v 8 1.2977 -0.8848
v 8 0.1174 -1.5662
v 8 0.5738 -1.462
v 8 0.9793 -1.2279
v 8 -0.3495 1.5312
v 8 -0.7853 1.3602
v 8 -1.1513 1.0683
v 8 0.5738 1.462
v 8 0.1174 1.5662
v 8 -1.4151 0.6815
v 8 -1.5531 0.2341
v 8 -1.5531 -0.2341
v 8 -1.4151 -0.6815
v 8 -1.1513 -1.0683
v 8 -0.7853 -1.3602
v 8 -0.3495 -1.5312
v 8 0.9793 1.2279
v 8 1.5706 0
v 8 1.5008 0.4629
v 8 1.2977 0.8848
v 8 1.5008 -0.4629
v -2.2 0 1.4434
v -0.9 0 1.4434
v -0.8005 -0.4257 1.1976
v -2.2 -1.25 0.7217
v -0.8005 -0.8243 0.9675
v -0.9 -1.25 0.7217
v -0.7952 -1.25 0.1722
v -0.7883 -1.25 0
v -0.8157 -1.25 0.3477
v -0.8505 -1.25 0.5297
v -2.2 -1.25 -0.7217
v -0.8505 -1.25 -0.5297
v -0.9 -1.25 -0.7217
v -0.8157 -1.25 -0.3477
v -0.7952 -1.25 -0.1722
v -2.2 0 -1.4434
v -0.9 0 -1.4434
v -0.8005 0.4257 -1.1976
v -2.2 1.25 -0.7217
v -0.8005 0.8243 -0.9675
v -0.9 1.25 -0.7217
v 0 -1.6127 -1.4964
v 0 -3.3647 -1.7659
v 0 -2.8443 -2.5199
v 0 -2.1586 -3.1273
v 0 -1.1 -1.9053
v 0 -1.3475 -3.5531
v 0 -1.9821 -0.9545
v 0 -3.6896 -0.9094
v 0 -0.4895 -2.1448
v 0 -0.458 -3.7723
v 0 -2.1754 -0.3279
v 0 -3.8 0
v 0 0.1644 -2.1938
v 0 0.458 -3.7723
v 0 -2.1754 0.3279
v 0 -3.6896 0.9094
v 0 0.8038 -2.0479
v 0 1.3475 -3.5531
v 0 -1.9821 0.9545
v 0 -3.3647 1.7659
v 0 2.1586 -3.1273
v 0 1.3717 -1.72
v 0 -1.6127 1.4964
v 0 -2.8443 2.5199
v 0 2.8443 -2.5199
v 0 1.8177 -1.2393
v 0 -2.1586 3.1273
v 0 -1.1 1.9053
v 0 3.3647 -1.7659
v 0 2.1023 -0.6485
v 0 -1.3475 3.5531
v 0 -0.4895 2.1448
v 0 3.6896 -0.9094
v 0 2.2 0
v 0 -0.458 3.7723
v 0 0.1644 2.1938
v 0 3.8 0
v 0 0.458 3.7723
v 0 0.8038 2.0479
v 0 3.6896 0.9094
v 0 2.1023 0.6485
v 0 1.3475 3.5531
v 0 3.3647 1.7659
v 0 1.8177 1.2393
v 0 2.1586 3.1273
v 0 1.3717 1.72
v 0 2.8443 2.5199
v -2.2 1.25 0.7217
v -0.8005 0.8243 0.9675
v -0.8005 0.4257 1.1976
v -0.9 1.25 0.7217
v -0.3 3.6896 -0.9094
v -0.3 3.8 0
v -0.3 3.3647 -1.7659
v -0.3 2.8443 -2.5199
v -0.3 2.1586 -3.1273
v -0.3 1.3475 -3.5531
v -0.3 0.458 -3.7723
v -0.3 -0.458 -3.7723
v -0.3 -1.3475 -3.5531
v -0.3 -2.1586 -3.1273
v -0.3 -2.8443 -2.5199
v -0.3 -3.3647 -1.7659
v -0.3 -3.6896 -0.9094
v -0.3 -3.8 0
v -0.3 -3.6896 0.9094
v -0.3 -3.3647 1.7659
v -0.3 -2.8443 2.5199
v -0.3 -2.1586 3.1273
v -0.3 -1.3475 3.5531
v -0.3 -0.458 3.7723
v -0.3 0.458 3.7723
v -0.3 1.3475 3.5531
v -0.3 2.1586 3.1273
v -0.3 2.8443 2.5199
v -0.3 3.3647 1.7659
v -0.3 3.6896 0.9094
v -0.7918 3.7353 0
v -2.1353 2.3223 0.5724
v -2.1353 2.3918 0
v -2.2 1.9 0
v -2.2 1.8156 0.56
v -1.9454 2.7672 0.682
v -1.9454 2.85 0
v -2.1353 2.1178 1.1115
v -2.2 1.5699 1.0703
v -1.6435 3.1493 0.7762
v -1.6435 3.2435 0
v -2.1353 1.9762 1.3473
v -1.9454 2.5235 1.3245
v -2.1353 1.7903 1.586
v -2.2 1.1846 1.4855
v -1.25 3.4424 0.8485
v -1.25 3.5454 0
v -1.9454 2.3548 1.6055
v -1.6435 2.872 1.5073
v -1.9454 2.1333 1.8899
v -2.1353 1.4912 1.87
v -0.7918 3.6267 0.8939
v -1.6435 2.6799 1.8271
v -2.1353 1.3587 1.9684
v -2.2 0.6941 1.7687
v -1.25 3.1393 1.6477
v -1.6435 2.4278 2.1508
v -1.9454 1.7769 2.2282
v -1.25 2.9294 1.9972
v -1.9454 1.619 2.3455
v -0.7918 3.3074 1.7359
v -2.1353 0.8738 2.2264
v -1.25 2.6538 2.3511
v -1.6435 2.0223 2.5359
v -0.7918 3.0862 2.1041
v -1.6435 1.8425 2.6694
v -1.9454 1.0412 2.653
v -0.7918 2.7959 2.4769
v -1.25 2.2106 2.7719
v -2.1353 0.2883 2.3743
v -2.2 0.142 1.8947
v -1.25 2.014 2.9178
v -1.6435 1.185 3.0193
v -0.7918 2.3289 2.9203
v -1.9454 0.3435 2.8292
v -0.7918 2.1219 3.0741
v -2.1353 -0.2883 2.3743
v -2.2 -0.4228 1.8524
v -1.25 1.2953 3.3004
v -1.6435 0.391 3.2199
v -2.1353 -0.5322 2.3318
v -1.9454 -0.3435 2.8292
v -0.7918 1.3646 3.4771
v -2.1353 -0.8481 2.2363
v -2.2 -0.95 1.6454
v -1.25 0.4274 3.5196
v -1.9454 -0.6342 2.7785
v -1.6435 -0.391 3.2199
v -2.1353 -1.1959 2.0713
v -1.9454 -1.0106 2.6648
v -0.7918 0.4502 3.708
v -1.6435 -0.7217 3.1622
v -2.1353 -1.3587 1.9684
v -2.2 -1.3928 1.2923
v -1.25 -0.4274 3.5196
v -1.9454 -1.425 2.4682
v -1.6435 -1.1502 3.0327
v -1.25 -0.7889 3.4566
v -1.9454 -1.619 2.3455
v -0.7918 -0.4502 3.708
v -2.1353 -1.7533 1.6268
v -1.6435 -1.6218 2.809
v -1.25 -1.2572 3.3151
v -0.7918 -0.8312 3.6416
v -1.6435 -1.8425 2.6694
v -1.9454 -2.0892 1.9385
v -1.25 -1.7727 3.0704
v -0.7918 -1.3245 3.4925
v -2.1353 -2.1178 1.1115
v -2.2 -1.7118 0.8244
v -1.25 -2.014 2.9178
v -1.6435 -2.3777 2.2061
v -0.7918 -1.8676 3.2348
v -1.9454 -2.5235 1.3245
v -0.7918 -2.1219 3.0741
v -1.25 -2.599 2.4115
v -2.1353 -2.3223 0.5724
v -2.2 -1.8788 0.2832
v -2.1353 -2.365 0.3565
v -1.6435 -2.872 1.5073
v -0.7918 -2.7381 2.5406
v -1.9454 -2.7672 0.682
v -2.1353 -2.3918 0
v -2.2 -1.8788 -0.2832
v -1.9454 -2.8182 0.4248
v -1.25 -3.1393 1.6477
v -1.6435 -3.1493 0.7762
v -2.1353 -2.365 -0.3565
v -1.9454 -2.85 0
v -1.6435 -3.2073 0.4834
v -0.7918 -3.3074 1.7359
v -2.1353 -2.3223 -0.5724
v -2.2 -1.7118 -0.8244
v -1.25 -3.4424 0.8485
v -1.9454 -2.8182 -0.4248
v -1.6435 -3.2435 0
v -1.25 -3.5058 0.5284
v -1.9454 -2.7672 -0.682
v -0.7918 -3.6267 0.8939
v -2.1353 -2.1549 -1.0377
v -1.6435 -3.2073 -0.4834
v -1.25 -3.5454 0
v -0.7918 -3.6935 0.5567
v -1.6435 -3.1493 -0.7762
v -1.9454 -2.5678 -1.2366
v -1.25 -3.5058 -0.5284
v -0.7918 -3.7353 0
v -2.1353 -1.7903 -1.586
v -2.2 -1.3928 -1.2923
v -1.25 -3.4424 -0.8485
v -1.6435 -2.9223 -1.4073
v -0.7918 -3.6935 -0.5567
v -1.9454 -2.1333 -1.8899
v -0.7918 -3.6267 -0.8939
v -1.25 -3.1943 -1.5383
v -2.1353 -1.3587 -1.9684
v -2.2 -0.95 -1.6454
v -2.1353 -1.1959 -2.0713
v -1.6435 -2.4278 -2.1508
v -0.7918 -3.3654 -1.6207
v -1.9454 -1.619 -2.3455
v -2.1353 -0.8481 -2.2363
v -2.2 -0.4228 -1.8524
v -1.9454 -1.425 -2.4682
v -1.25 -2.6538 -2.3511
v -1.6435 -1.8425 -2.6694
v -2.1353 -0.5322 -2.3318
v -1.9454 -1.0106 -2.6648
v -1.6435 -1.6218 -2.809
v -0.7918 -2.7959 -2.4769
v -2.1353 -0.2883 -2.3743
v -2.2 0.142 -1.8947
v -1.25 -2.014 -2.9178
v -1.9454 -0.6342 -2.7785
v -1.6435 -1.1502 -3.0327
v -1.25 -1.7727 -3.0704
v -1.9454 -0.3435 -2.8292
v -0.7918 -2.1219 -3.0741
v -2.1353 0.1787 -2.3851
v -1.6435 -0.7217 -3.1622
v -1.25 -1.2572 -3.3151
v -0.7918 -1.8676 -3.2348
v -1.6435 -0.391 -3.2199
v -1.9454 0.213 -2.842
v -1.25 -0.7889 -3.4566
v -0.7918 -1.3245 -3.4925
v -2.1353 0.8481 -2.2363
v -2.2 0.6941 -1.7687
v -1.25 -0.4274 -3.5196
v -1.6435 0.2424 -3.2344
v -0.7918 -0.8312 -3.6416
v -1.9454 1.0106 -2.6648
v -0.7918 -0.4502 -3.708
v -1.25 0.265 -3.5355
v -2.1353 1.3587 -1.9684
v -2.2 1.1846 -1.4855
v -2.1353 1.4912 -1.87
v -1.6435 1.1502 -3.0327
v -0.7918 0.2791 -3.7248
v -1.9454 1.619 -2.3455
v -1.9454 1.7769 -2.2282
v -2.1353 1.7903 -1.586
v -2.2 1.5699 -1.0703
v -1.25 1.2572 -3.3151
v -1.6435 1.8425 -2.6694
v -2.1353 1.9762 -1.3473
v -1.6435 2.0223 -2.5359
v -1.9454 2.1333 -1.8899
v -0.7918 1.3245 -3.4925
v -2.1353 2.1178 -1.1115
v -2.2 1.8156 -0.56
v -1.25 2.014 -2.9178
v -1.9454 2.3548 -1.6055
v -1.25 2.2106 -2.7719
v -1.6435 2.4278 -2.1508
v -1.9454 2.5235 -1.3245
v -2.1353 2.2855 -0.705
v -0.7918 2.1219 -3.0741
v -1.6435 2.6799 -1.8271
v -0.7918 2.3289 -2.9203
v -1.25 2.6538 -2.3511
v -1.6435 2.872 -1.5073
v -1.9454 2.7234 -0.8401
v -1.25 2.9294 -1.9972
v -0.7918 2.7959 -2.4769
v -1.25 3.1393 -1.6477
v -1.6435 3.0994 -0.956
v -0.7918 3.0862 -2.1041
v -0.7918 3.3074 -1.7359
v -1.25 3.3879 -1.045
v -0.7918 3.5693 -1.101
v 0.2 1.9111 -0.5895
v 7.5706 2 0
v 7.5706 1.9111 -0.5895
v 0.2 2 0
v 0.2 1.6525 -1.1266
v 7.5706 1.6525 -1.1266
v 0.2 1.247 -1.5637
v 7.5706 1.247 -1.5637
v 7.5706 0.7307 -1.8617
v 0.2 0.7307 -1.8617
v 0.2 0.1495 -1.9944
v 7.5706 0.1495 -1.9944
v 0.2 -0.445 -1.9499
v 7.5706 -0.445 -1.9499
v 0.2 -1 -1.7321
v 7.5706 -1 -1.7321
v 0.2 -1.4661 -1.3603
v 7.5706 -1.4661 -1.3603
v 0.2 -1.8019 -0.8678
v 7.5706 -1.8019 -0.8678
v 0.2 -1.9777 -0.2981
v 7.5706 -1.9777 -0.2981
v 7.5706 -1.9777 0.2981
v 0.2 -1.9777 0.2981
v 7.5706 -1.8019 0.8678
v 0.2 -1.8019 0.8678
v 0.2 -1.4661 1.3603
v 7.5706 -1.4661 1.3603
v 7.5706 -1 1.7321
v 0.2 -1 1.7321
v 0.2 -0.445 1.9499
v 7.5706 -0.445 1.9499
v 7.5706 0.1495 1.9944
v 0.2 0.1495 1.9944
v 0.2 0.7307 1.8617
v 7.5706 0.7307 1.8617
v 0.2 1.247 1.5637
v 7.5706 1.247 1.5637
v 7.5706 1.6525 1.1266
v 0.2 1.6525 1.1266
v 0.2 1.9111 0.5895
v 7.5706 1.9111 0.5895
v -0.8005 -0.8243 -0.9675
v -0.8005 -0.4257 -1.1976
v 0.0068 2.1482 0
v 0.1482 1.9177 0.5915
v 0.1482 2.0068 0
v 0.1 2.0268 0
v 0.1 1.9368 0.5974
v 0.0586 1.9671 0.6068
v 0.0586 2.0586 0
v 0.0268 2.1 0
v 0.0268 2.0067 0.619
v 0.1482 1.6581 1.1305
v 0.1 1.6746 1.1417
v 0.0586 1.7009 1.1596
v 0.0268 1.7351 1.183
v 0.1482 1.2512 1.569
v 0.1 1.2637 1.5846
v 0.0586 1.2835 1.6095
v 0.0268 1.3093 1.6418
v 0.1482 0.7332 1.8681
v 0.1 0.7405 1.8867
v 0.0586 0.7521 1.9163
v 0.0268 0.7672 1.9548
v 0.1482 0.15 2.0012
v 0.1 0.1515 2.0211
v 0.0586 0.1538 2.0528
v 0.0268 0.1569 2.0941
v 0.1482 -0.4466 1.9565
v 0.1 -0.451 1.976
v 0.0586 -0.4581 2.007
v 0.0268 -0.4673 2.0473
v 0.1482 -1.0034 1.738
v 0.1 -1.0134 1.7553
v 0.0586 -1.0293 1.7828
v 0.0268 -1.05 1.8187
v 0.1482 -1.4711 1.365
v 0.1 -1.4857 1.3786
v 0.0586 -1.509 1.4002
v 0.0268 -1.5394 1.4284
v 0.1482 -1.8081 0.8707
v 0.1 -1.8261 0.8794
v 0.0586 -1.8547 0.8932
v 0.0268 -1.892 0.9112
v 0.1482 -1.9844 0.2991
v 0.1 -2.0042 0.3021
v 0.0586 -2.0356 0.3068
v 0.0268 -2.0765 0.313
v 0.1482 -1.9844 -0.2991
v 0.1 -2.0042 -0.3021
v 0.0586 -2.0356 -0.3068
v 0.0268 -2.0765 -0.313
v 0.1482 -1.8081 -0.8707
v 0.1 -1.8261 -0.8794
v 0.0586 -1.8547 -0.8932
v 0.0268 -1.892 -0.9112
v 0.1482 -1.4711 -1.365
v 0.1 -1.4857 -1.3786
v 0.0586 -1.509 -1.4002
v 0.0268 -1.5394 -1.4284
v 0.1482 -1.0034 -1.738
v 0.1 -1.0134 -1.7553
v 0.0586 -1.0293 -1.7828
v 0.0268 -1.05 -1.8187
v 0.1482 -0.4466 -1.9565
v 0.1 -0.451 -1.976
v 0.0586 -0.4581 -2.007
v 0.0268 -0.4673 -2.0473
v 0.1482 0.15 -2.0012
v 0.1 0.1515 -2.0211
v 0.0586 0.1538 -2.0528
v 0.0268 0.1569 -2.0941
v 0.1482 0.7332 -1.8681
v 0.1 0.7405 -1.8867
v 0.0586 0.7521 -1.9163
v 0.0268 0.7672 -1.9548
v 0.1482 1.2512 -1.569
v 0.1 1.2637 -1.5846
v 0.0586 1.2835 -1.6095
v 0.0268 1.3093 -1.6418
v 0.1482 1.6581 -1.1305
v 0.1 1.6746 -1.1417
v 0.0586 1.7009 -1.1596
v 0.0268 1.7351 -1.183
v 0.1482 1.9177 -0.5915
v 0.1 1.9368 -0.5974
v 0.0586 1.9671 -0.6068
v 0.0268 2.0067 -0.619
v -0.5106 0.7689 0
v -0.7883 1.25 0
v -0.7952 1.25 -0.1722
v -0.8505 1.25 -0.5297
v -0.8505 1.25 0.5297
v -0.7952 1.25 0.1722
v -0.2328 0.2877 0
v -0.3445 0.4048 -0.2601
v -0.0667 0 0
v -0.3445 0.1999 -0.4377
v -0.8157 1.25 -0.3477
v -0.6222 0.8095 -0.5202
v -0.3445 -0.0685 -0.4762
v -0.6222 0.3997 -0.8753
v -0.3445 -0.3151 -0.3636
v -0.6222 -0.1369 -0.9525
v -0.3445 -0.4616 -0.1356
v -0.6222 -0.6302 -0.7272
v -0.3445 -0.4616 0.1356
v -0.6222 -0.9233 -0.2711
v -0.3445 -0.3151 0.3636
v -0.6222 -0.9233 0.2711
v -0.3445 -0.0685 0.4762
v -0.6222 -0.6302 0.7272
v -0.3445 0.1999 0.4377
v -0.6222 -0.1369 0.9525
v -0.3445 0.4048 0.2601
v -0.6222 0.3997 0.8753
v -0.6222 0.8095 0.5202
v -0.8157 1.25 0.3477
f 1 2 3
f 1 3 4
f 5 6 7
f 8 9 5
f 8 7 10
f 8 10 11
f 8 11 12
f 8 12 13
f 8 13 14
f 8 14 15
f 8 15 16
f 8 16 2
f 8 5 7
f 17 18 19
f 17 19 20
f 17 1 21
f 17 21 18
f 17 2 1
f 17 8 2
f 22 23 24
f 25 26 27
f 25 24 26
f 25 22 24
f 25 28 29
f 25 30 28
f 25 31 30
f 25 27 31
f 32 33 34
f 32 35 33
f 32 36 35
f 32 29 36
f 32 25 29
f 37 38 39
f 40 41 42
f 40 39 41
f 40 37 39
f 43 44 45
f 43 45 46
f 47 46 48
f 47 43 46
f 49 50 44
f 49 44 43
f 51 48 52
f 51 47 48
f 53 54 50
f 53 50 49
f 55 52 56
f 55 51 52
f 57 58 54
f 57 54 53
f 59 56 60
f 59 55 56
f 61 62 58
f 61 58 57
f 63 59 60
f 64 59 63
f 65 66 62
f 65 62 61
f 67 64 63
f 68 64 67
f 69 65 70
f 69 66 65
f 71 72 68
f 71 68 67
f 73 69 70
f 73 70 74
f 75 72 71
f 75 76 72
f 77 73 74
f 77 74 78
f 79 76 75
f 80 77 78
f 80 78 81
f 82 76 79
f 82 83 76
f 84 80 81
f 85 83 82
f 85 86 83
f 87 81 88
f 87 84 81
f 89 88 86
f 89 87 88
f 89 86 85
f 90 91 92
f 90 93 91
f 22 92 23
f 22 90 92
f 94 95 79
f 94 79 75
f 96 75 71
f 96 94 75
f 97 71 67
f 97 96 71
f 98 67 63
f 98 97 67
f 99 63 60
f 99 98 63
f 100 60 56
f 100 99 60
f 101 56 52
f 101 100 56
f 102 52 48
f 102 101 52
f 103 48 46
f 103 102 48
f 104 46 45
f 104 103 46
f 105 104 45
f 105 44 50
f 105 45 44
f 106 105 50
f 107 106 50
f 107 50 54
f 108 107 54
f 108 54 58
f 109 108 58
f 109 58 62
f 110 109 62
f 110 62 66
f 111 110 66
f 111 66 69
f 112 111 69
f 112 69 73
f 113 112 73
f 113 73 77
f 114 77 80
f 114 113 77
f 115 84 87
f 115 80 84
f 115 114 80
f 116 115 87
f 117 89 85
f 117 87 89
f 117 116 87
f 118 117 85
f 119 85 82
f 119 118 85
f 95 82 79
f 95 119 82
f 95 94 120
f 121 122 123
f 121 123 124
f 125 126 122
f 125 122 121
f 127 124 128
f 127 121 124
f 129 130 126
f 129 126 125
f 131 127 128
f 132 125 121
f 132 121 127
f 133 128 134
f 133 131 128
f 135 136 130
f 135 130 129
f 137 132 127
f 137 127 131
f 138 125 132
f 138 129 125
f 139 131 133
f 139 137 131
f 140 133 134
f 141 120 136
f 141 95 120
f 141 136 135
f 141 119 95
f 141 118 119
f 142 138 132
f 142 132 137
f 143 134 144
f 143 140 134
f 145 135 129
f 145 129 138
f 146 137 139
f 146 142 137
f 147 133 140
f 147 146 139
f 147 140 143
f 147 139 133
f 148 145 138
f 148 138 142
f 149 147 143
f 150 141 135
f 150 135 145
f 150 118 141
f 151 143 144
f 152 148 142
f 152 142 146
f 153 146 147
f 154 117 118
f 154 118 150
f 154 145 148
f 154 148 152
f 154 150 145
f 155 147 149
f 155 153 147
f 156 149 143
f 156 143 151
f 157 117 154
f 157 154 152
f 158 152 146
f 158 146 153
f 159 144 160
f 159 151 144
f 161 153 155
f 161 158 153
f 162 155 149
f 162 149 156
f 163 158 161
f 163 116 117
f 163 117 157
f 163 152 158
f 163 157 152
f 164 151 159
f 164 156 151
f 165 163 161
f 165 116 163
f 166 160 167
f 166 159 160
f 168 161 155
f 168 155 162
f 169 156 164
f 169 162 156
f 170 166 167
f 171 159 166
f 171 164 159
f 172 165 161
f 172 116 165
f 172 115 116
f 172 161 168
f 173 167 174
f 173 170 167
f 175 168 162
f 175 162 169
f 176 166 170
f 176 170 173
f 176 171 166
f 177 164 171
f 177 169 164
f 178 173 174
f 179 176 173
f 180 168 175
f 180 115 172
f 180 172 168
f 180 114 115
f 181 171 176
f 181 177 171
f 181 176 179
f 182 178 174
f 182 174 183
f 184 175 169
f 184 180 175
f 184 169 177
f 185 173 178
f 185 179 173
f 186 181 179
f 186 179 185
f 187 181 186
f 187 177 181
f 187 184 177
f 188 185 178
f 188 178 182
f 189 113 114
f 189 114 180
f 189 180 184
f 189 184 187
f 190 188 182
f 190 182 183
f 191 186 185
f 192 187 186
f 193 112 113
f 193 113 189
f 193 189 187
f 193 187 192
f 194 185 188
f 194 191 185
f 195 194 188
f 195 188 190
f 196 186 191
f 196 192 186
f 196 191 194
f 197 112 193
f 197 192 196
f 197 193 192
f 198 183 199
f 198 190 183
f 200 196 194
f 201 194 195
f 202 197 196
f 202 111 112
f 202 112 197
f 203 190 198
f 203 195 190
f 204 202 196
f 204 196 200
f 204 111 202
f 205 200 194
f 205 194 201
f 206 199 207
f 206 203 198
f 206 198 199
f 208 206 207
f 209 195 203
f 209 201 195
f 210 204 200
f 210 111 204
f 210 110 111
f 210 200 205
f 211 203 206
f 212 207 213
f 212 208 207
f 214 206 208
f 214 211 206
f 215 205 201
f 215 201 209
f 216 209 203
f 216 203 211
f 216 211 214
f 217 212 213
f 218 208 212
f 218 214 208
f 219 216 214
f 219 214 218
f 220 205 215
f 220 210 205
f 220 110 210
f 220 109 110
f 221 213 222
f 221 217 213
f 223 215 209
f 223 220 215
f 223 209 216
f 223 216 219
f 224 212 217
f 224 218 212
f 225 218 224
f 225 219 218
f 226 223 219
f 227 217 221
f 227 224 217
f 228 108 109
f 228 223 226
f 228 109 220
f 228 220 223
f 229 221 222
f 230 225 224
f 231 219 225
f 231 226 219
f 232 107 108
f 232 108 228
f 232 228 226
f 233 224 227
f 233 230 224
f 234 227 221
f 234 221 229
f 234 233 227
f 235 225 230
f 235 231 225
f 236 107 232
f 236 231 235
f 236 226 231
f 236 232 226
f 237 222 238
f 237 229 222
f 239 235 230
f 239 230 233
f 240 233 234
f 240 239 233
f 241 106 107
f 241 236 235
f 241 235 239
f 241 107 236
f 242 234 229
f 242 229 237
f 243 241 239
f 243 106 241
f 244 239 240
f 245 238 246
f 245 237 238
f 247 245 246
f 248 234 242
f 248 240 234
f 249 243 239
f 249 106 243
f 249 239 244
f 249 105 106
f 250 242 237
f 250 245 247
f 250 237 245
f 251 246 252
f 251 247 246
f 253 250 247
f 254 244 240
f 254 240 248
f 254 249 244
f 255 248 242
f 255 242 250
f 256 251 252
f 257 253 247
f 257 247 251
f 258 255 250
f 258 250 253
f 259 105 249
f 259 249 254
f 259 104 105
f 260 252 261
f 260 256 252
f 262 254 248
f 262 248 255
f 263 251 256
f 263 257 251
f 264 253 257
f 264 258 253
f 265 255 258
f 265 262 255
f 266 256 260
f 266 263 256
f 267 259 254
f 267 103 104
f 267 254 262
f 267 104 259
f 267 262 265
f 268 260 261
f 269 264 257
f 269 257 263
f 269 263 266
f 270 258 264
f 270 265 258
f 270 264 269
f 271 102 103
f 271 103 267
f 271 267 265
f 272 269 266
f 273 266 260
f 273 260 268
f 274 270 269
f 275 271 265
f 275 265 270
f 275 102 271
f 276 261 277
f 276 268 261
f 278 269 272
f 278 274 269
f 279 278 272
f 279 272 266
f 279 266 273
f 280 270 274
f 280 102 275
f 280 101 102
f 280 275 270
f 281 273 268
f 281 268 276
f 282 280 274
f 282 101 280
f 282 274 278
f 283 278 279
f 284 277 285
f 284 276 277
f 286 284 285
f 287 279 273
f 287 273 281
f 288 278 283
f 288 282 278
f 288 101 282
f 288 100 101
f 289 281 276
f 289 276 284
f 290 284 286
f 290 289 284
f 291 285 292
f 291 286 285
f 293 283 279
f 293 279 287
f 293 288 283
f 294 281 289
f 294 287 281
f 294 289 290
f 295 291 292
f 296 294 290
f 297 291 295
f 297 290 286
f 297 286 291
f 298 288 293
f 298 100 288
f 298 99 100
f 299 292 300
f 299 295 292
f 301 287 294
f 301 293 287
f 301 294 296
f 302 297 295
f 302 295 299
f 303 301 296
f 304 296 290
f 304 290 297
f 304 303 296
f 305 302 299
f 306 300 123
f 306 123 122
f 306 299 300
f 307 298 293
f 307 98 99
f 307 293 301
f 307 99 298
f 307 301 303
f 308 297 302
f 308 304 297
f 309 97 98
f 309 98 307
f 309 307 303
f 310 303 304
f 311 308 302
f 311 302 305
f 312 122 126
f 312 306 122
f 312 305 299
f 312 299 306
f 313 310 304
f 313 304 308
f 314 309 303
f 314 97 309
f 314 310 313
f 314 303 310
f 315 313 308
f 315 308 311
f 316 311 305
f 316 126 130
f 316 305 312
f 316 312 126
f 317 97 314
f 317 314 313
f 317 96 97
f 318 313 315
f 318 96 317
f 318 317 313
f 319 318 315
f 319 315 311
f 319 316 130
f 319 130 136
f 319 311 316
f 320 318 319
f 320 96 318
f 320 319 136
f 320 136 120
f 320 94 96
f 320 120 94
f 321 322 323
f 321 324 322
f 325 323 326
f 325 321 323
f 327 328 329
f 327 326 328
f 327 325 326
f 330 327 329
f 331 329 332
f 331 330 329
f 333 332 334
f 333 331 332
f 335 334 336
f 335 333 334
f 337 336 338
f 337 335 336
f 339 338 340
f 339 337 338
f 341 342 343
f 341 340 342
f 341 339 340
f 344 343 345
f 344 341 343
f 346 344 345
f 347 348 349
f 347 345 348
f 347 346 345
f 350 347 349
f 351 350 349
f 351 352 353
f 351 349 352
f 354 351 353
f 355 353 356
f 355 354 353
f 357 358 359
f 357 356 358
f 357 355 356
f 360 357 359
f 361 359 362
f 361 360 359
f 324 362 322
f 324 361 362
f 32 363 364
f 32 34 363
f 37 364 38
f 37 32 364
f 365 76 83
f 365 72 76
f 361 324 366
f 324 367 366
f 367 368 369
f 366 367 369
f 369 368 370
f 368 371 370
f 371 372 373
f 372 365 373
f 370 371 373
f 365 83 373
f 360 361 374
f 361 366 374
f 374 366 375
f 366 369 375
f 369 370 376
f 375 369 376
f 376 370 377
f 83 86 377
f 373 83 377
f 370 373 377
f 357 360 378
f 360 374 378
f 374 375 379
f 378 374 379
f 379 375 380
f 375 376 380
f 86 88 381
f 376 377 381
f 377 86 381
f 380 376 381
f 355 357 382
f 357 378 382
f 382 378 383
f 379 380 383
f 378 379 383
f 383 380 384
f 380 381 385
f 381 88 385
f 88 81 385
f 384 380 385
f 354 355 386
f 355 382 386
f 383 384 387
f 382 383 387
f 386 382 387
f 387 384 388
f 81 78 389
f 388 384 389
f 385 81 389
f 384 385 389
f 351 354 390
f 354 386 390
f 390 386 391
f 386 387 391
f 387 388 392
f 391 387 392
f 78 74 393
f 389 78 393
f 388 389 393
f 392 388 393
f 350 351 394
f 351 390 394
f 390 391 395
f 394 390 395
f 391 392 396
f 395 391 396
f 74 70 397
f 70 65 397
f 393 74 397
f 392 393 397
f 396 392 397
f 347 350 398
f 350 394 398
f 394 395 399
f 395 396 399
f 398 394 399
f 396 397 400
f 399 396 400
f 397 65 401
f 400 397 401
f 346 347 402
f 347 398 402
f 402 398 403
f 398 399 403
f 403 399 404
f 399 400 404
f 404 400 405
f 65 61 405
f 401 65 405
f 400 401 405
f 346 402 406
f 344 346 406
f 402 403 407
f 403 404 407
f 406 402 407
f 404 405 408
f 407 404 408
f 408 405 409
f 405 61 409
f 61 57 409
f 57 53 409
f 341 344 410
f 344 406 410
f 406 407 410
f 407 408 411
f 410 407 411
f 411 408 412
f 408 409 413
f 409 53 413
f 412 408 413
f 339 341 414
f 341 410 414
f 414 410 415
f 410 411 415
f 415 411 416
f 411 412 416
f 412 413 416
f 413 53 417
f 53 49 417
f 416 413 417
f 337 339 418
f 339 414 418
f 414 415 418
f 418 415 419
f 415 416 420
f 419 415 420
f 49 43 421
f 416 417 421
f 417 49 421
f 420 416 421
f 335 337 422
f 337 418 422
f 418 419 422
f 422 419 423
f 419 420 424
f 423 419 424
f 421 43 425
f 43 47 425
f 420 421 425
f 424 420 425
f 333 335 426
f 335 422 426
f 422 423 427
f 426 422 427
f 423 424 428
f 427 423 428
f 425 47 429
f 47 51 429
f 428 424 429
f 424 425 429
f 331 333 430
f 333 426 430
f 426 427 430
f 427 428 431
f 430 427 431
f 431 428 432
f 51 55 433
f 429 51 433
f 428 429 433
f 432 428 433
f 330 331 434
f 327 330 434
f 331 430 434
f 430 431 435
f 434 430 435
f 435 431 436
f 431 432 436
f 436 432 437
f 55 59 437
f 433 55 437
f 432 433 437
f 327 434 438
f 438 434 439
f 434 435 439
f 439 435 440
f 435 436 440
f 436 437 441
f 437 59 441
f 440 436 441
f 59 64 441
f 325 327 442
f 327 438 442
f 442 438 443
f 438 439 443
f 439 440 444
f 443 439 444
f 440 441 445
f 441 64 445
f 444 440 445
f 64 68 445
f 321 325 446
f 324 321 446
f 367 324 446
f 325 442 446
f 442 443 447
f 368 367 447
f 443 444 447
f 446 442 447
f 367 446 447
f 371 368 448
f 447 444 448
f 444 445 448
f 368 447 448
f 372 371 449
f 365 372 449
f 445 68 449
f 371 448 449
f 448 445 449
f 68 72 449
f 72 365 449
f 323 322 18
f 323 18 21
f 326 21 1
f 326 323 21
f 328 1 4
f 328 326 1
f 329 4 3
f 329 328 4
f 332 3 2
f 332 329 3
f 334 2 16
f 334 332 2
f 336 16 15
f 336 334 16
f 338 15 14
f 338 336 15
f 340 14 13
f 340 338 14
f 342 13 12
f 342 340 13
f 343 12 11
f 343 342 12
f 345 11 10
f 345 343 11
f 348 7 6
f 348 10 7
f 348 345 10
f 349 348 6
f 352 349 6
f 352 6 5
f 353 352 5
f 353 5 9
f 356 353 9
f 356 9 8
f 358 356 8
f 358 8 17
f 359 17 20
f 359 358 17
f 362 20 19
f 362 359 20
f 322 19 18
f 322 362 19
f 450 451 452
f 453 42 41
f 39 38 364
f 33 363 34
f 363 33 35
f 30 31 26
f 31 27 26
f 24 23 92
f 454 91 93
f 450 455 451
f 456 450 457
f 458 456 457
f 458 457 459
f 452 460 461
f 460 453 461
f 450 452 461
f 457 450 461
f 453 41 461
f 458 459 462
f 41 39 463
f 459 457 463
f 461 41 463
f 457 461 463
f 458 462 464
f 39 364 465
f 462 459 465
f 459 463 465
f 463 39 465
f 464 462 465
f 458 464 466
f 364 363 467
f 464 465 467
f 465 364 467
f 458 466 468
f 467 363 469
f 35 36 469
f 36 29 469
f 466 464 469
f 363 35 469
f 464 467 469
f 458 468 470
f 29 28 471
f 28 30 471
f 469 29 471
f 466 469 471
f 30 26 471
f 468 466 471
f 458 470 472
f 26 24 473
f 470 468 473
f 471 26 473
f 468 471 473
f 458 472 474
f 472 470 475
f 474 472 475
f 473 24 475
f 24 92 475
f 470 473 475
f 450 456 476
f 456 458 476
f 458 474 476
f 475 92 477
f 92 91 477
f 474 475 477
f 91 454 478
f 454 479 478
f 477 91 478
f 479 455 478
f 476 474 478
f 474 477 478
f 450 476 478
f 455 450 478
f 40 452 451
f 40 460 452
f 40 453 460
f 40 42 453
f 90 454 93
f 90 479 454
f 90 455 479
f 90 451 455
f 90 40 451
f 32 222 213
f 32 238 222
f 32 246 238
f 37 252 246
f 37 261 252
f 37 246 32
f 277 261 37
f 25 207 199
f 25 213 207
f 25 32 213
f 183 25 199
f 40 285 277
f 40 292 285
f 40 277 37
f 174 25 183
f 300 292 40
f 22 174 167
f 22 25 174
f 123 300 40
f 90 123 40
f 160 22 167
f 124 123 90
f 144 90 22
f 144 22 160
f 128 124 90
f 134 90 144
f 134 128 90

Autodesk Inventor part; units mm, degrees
ref_plane "YZ Plane" through (0, 0, 0) normal (1, 0, 0) x (0, 1, 0)
ref_plane "XZ Plane" through (0, 0, 0) normal (0, 1, 0) x (-1, 0, 0)
sketch "Sketch1" plane through (0, 0, 0) normal (0, 0, 1) x (1, 0, 0)
  line L0 (-0.0667, 0) -> (8, 0)
  line L1 (8, 0) -> (8, 2)
  line L2 (8, 2) -> (1.4, 2)
  line L3 (1.4, 2) -> (0.9706, 2)
  line L4 (0.9706, 2) -> (0, 2)
  line L5 (0, 2) -> (0, 3.8)
  line L6 (0, 3.8) -> (-2.2, 3.8)
  line L7 (-2.2, 3.8) -> (-2.2, 1.4434)
  line L8 (-2.2, 1.4434) -> (-0.9, 1.4434)
  line L9 (-0.9, 1.4434) -> (-0.0667, 0)
  line L10 (-4.24, 0) -> (10.04, 0) projected
  line L11 (0, -0.76) -> (0, 4.56) projected
  line L12 (1.4, 2) -> (0, 2) construction
  dimension "d0" = 6.6
  dimension "d1" = 0.4294
  dimension "d2" = 2.2
  dimension "d3" = 1.3
  dimension "d4" = 60
  dimension "d5" = 4
  dimension "d6" = 4
  dimension "d7" = 2.8868
  dimension "d8" = 7.6
  dimension "d19" = 8
revolve "Body" add sketch "Sketch1" angle 360 about axis through (-0.0667, 0, 0) along (1, 0, 0)
sketch "Sketch2" plane through (-2.2, 0, 0) normal (-1, 0, 0) x (0, 0, 1)
  circle A0 centre (0, 0) radius 1.4434 projected
  line L0 (0, -5.32) -> (0, 5.32) projected
  line L1 (-5.32, 0) -> (5.32, 0) projected
  line L2 (1.4434, 0) -> (0.7217, -1.25)
  line L3 (0.7217, -1.25) -> (-0.7217, -1.25)
  line L4 (-0.7217, -1.25) -> (-1.4434, 0)
  line L5 (-1.4434, 0) -> (-0.7217, 1.25)
  line L6 (-0.7217, 1.25) -> (0.7217, 1.25)
  line L7 (0.7217, 1.25) -> (1.4434, 0)
  point P0 (0, 0)
extrude "Slot" add sketch "Sketch2" against normal up to next contours L7 A0 | A0 L2 | L6 L0 A0 | A0 L0 L3 | L0 L6 A0 | A0 L3 L0 | L4 A0 | A0 L5
fillet "Fillet1" radius 1.9 1 edges at (-2.2, -3.8, 0)
thread "Thread" size "M4x0.7" class "4g6g" standard "ANSI Metric M Profile" length 6.6
chamfer "Chamfer1" distance 0.4294 distance2 0.4294 1 edges at (8, -2, 0) measured on face at (8, 0.556, 0.0273)
fillet "Fillet2" radius 0.2 1 edges at (0, -2, 0)
ref_plane "Work Plane1" through (30, 0, 0) normal (0, -0.5, 0.8660254) x (1, 0, 0)
equation "\"d0\" = GEL"
equation "\"d1\" = GAL"
equation "\"d2\" = KOH"
equation "\"d3\" = INTI"
equation "\"d5\" = GD"
equation "\"d6\" = BDM"
equation "\"d7\" = 1.1547 * SW"
equation "\"d8\" = KOD"
equation "\"d19\" = NLG"
equation "\"d16\" = RR"
equation "\"d12\" = GEL"
equation "\"d14\" = -0.5 * SPD + 0.5 * GD"
equation "\"d15\" = GUL"
equation "\"d29\" = R"
equation "\"GD\" = NND"
equation "\"NLG\" = 8"
equation "\"GEL\" = 6.6"
equation "\"KOD\" = 7.6"
equation "\"KOH\" = 2.2"
equation "\"INTI\" = 1.3"
equation "\"GAL\" = 0.61345 * PTC"
equation "\"GUL\" = 0.61345 * PTC"
equation "\"BDM\" = NND"
equation "\"SW\" = 2.5"
equation "\"RR\" = 1.9"
equation "\"SPD\" = 3.14117"
equation "\"d28\" = R"
equation "\"R\" = 0.2"
equation "\"TOA\" = 30deg"
equation "\"THREADDIA\" = 4"
equation "\"KOD1\" = KOD - 2 * RR"
equation "\"PTC\" = 0.7"
equation "\"NND\" = 4"
equation "\"E0\" = 1.155 * SW"
equation "\"GD1\" = THREADDIA - 1.2269 * PTC"
properties part number "ANSI B18.3.4M - M4 x 0.7 x 8, BHSBHCSM" material "Steel, Mild"
